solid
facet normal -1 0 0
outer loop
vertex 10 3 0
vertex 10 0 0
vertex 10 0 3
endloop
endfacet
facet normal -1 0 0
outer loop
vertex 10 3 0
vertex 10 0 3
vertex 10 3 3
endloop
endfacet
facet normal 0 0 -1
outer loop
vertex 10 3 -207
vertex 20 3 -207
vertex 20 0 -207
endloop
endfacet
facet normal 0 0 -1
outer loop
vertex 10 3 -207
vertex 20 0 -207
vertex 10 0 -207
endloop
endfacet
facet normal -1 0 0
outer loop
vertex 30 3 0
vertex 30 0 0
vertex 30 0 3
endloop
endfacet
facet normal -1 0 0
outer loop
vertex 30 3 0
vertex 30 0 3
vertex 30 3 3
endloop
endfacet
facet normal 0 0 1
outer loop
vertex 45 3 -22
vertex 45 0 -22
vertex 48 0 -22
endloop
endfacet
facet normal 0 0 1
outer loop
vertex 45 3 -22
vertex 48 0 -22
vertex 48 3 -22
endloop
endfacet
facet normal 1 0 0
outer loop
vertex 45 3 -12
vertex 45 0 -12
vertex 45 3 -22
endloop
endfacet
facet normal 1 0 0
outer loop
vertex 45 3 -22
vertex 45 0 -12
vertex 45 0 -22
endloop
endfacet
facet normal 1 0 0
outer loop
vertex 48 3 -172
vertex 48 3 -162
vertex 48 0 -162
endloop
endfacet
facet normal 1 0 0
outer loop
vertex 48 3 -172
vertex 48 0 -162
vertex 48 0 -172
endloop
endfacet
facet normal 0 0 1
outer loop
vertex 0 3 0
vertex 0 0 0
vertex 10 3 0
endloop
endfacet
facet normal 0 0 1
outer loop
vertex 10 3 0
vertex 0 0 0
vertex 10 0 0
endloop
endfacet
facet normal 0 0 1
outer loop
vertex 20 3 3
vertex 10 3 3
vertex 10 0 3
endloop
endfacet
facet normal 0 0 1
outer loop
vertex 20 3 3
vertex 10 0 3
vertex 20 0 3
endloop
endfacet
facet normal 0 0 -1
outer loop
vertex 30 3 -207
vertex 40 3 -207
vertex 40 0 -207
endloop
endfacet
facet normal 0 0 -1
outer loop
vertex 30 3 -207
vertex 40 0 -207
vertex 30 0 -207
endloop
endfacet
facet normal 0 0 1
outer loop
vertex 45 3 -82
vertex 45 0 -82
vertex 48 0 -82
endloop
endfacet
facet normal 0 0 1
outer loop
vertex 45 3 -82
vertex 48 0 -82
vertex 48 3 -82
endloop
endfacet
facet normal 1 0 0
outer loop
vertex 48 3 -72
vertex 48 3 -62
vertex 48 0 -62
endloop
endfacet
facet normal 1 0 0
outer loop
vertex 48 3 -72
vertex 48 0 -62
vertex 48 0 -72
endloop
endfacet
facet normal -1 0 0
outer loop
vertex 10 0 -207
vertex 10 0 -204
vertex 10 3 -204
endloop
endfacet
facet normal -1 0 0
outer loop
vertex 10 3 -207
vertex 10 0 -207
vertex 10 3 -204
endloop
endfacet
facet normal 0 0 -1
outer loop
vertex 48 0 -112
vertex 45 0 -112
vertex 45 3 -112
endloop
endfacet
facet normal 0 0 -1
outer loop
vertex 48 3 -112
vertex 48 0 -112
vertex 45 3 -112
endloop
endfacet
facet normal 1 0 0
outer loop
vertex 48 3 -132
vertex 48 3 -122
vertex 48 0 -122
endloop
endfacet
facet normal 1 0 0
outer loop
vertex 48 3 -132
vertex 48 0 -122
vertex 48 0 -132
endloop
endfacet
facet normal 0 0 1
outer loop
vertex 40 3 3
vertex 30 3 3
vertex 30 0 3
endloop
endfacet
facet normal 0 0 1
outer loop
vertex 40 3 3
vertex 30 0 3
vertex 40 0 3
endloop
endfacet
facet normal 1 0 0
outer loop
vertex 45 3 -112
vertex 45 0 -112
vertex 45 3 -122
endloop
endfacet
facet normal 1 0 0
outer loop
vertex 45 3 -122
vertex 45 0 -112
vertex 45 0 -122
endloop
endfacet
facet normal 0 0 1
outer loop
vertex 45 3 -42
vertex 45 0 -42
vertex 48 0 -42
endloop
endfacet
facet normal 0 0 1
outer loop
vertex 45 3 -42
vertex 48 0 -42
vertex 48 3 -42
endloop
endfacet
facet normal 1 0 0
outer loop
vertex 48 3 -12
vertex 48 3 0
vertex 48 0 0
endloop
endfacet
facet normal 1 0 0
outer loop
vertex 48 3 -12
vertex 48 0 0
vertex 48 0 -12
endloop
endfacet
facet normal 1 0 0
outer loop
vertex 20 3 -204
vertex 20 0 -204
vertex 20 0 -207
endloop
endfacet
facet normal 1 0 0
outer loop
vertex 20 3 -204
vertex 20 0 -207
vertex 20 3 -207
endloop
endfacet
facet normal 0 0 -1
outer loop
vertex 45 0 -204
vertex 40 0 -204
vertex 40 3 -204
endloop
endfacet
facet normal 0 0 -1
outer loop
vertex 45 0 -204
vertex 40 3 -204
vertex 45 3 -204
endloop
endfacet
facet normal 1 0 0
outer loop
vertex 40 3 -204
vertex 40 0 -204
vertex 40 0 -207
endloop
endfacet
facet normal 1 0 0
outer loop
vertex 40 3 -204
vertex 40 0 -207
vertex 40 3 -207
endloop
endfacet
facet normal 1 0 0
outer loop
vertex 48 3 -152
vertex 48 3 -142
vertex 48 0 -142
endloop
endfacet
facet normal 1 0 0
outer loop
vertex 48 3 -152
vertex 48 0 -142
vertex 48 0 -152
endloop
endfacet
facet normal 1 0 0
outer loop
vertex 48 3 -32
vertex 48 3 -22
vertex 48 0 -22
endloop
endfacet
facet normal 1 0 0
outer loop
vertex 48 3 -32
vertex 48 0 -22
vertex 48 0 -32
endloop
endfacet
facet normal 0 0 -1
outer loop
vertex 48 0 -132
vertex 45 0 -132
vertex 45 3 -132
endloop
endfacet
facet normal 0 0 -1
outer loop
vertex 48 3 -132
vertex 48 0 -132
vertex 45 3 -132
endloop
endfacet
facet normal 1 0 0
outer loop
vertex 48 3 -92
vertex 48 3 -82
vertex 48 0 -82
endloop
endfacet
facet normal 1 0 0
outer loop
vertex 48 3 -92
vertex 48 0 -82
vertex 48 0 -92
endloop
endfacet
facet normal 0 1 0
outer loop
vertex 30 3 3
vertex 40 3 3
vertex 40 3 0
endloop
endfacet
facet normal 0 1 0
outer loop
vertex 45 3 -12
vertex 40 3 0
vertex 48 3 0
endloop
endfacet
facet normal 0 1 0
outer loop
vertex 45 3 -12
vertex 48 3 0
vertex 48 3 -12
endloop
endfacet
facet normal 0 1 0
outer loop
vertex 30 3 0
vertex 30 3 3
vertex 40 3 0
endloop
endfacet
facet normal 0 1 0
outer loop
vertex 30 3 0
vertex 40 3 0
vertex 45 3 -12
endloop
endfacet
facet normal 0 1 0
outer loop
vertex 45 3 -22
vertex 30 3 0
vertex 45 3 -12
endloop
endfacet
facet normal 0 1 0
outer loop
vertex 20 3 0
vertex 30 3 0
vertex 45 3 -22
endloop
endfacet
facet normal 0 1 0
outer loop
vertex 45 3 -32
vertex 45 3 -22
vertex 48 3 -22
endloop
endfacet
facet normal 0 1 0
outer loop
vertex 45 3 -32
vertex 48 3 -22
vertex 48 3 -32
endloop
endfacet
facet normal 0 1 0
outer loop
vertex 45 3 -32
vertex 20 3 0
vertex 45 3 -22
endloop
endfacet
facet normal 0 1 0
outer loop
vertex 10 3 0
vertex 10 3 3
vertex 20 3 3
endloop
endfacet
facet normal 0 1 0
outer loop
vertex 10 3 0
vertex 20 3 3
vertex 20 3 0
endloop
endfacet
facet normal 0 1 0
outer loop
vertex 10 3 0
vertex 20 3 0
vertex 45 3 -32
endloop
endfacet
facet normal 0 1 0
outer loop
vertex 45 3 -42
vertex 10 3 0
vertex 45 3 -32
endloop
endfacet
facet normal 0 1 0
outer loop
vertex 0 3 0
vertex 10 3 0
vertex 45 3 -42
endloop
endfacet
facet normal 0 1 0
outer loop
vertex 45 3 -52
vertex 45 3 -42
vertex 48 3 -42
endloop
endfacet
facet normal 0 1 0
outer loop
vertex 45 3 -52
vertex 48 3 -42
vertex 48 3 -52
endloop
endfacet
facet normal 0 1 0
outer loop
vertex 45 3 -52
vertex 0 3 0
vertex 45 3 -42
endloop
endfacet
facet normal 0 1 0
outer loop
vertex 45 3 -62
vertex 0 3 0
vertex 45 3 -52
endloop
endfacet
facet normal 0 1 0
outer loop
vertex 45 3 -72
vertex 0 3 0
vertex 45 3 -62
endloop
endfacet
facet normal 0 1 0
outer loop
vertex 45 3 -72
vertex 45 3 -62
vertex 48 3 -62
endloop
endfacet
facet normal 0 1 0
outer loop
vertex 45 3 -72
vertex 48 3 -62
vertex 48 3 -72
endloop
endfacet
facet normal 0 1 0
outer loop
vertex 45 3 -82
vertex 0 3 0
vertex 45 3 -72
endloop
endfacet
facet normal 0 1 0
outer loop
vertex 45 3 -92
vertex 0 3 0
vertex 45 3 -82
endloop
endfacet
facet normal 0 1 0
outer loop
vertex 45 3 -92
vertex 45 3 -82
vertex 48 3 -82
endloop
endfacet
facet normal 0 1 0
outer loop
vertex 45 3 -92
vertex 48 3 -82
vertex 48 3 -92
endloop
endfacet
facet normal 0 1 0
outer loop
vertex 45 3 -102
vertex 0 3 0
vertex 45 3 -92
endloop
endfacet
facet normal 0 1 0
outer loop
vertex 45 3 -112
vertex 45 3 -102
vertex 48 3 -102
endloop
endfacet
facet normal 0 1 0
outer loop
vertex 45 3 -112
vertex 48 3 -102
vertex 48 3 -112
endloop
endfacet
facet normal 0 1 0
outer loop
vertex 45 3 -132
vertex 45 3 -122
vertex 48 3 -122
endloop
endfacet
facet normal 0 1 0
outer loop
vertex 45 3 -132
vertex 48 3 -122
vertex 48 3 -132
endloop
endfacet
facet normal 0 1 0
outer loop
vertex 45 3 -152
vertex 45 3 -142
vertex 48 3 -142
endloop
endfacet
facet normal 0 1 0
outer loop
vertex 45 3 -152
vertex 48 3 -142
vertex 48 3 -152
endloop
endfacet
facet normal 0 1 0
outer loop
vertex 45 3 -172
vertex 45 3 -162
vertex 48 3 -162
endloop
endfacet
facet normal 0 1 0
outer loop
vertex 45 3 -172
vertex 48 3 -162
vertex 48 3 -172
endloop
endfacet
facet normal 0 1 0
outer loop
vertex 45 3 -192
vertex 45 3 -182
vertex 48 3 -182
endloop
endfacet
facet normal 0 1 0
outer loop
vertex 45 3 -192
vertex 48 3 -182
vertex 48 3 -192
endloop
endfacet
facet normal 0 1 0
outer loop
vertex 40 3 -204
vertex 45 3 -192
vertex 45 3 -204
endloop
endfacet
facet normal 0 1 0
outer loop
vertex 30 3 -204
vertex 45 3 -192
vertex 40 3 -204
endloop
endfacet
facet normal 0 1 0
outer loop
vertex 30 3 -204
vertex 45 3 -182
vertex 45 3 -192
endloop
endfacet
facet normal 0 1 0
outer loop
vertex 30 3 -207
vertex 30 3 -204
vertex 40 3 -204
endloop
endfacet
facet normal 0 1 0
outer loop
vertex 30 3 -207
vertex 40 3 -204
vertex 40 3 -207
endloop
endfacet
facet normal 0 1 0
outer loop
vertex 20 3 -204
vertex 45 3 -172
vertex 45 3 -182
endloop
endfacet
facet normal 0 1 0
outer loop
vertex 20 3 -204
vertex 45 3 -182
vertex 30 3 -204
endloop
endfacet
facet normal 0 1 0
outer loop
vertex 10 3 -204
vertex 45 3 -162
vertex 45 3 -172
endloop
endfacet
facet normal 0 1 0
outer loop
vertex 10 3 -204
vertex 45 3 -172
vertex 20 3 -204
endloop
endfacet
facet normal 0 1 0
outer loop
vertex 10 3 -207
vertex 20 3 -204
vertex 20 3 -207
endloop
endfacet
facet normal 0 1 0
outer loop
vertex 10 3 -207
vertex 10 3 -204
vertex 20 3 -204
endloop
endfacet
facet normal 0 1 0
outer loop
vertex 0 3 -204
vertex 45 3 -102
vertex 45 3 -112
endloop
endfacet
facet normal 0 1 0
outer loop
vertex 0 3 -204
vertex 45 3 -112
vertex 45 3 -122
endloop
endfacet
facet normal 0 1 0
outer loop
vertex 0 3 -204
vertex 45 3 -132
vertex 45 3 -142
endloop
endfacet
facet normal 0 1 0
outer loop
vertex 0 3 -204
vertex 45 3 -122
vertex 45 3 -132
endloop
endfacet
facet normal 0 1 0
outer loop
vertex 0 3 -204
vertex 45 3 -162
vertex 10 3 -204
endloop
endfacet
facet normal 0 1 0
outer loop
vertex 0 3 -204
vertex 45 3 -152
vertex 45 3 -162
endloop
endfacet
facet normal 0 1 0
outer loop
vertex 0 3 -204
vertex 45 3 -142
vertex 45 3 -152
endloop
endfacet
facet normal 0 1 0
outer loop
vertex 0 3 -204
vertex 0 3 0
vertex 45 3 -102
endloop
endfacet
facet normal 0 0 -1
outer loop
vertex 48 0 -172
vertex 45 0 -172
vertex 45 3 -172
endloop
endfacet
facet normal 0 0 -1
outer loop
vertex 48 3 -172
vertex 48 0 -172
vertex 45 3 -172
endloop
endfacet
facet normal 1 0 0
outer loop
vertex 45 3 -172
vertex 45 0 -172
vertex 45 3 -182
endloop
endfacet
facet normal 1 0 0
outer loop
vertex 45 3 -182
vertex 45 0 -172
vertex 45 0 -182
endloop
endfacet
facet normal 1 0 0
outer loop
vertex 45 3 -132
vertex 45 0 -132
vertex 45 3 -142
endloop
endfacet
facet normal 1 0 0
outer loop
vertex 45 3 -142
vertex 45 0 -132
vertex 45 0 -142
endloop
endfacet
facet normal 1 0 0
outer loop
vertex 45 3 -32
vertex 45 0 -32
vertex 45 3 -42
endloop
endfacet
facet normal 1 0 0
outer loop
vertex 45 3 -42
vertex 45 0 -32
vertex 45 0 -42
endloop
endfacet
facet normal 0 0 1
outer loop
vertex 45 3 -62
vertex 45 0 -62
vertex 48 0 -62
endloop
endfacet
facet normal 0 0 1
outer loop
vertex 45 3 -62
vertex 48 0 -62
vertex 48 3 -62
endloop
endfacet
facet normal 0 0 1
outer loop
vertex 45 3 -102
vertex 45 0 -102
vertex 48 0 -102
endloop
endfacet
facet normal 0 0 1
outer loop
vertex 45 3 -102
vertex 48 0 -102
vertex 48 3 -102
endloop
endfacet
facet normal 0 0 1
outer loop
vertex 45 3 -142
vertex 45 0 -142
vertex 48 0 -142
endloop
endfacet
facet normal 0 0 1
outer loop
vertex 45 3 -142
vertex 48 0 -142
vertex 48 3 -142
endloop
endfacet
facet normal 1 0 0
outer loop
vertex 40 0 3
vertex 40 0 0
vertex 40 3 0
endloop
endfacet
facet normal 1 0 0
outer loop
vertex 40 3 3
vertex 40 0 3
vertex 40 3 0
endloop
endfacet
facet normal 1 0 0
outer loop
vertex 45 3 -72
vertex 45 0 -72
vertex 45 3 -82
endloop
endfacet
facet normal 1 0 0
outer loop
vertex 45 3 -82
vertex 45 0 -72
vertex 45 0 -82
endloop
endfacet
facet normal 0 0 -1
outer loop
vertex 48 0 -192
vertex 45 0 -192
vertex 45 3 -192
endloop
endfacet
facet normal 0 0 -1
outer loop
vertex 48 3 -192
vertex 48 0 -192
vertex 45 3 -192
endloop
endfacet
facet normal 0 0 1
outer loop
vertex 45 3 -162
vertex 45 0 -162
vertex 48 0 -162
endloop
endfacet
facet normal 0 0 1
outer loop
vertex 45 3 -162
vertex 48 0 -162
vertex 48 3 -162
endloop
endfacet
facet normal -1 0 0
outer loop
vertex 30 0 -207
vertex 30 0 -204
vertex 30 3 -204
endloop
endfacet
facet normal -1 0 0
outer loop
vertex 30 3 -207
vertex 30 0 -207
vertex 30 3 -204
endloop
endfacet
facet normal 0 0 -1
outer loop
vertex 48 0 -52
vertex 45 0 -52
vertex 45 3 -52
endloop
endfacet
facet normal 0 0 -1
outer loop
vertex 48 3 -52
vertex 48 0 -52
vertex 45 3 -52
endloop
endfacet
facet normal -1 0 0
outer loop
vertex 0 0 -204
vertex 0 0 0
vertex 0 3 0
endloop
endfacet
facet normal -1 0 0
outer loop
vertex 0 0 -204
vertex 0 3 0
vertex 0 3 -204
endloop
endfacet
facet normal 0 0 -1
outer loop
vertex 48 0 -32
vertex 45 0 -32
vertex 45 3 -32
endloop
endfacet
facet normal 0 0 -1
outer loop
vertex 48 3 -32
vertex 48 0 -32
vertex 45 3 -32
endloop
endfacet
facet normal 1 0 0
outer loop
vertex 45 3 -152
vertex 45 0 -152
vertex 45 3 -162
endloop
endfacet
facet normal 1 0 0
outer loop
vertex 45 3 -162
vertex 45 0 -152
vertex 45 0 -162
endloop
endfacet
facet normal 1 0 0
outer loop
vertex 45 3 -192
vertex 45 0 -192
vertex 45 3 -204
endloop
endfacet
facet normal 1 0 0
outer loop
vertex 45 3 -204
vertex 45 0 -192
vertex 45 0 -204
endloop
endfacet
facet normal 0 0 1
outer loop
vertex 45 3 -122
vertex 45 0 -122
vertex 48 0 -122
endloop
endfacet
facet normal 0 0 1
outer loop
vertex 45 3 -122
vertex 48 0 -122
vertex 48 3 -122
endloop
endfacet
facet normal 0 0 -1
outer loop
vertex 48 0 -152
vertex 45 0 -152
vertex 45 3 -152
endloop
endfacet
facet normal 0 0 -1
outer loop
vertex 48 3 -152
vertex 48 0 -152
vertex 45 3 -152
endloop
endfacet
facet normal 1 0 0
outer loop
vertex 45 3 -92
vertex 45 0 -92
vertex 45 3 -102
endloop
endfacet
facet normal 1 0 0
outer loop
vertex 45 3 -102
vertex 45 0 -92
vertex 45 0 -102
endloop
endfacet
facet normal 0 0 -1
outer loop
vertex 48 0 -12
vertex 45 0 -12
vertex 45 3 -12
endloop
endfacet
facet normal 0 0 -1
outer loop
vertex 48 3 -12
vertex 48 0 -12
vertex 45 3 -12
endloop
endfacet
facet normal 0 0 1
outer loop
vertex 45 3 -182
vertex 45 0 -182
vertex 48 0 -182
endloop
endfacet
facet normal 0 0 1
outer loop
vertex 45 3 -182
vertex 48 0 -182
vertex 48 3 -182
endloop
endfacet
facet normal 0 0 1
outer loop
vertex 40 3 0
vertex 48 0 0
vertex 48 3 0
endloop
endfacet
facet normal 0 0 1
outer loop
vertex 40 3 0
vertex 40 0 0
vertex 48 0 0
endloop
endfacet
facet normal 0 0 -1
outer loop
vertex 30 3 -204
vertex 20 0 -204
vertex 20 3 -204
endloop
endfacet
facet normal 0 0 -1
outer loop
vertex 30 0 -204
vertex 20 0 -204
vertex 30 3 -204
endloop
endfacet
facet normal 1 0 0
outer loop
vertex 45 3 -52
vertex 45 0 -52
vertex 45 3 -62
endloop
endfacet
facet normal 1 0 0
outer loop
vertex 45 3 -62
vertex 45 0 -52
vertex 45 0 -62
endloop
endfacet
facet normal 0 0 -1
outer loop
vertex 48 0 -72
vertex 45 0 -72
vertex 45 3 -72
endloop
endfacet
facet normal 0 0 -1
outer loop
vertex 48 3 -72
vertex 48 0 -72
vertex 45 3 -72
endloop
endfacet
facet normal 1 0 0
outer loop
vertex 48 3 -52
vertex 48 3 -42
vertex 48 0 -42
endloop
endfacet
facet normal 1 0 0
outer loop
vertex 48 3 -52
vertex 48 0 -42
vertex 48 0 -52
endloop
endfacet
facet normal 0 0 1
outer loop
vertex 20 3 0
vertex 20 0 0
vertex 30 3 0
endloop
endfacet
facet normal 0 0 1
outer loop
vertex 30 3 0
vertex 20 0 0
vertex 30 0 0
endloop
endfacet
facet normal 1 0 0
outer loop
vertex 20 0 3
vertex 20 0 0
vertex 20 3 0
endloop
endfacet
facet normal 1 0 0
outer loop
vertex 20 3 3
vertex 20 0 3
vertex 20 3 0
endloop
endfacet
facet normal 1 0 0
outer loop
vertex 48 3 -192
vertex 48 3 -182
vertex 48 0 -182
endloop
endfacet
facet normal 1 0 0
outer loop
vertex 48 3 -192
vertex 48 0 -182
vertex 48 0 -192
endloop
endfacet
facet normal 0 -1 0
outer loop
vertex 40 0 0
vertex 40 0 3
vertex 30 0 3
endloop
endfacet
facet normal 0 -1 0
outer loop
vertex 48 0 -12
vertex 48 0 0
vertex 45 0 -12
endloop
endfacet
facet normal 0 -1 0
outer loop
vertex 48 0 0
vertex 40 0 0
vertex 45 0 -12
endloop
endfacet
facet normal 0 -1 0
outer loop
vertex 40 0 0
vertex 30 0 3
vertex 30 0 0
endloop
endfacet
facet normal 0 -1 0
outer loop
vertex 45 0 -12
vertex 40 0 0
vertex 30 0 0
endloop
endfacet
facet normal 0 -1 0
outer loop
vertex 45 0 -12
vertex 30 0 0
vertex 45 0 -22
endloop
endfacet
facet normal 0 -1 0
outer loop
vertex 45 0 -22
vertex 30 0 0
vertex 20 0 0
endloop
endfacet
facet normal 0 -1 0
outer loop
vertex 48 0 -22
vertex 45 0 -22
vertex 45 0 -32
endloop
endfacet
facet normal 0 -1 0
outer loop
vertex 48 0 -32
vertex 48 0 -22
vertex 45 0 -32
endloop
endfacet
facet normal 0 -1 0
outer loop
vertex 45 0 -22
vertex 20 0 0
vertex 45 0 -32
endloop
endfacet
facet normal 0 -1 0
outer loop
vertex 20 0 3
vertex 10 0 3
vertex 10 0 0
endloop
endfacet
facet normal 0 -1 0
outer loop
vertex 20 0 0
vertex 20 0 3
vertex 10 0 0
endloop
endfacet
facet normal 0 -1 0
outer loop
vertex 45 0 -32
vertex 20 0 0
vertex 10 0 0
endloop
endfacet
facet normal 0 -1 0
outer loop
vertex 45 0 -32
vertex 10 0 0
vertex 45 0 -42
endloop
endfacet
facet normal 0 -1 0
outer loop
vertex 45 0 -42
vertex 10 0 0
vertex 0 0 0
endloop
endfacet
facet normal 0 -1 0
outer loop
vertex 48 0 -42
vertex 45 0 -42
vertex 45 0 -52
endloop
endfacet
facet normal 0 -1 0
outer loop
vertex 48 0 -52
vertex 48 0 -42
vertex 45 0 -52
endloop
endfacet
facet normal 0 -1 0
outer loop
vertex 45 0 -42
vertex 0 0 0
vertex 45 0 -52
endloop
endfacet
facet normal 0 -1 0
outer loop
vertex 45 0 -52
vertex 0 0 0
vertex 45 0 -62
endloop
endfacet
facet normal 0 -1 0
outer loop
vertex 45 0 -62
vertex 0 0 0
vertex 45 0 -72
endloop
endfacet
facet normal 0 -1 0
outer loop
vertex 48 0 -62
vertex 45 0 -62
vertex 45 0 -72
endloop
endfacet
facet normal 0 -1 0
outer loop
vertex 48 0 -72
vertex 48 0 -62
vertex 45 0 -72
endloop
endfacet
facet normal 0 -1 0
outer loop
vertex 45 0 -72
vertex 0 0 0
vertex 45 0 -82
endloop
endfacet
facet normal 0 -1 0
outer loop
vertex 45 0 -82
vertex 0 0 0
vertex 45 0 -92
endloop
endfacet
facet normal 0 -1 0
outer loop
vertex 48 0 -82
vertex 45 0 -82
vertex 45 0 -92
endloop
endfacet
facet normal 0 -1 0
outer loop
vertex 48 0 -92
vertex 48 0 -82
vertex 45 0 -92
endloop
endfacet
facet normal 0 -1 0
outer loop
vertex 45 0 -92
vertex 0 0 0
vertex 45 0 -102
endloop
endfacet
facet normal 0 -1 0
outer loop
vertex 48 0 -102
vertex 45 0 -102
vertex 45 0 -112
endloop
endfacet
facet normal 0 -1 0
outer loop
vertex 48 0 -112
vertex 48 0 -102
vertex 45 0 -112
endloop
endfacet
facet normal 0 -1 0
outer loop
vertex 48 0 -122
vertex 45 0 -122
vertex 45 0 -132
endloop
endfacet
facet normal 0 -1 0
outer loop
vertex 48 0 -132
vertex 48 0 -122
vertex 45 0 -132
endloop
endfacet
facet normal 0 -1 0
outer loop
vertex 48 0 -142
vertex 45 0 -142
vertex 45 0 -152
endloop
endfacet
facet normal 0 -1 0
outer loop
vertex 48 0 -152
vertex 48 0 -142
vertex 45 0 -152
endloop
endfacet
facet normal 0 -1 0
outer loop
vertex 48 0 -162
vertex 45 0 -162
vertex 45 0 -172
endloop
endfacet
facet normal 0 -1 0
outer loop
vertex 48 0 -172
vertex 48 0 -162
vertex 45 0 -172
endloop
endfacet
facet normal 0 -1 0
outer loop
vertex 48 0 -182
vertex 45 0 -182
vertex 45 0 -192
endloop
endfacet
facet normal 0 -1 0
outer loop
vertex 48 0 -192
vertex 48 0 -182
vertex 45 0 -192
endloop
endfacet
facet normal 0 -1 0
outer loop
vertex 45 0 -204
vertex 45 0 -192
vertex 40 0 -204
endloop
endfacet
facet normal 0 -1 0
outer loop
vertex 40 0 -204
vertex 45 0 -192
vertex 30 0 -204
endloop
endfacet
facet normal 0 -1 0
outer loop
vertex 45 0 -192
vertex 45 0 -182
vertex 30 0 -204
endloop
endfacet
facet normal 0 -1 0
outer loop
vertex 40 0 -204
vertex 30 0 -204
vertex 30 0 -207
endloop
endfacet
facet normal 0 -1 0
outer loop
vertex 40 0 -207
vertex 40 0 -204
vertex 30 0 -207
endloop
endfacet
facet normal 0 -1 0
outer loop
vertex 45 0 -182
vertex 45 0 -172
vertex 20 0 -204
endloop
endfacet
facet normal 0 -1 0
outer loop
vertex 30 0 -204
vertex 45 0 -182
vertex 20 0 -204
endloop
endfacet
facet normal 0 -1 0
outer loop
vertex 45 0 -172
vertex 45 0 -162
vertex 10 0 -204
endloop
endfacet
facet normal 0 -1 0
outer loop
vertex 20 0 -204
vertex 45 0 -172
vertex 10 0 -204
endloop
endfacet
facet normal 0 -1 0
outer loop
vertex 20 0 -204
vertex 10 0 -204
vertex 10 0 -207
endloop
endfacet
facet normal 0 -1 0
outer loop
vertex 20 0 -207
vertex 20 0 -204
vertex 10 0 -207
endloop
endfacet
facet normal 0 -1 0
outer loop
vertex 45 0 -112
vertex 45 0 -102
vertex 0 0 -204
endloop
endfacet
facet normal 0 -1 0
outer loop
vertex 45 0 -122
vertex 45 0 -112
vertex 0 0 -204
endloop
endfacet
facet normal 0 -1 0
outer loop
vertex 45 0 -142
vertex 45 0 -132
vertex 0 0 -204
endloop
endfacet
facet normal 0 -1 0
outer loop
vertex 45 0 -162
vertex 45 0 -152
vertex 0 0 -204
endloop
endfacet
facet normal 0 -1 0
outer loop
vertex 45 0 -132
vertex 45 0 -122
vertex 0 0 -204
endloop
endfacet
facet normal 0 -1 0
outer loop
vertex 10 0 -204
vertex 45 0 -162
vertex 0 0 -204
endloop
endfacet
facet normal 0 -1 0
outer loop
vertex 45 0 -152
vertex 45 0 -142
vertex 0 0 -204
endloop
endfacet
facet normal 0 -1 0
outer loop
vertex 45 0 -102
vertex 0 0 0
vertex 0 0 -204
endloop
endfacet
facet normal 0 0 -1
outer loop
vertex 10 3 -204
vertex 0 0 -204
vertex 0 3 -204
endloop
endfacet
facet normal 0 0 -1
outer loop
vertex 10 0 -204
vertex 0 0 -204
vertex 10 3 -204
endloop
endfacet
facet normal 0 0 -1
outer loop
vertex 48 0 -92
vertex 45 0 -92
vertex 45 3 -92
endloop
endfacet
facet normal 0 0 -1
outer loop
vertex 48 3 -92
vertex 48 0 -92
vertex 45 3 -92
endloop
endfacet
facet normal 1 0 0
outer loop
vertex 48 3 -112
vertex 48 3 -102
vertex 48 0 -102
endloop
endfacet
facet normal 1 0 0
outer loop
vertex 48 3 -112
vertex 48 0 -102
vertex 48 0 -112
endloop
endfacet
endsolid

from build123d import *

# Parameters (mm, degrees)
SKETCH1_W           = 45
SKETCH1_H           = 204
BOSS_EXTRUDE1_DEPTH = 3
SKETCH2_W           = 10
SKETCH2_H           = 3
BOSS_EXTRUDE2_DEPTH = 3
LPATTERN1_COUNT     = 2
LPATTERN1_PITCH     = 20
SKETCH3_W           = 10
SKETCH3_H           = 3
BOSS_EXTRUDE3_DEPTH = 3
LPATTERN2_COUNT     = 2
LPATTERN2_PITCH     = 20
SKETCH4_W           = 12
SKETCH4_H           = 3
SKETCH4_W_2         = 10
BOSS_EXTRUDE4_DEPTH = 3


with BuildPart() as part:
    # Sketch1 → Boss-Extrude1 (new body)
    with BuildSketch(Plane(origin=(0, 0, 0), x_dir=(1, 0, 0), z_dir=(0, 1, 0))):
        with Locations((22.5, 102)):
            Rectangle(SKETCH1_W, SKETCH1_H)
    extrude(amount=BOSS_EXTRUDE1_DEPTH)

    # Sketch2 → Boss-Extrude2 (add)
    with BuildSketch(Plane.XY):
        with Locations((35, 1.5)):
            Rectangle(SKETCH2_W, SKETCH2_H)
    boss_extrude2 = extrude(amount=BOSS_EXTRUDE2_DEPTH)

    # LPattern1: Boss-Extrude2 ×2
    with Locations(*[(-i * LPATTERN1_PITCH, 0, 0) for i in range(1, LPATTERN1_COUNT)]):
        add(boss_extrude2)

    # Sketch3 → Boss-Extrude3 (add)
    with BuildSketch(Plane(origin=(0, 0, -204), x_dir=(-1, 0, 0), z_dir=(0, 0, -1))):
        with Locations((-35, 1.5)):
            Rectangle(SKETCH3_W, SKETCH3_H)
    boss_extrude3 = extrude(amount=BOSS_EXTRUDE3_DEPTH)

    # LPattern2: Boss-Extrude3 ×2
    with Locations(*[(-i * LPATTERN2_PITCH, 0, 0) for i in range(1, LPATTERN2_COUNT)]):
        add(boss_extrude3)

    # Sketch4 → Boss-Extrude4 (add)
    with BuildSketch(Plane(origin=(45, 0, 0), x_dir=(0, 0, -1), z_dir=(1, 0, 0))):
        with Locations((6, 1.5)):
            Rectangle(SKETCH4_W, SKETCH4_H)
        with Locations((27, 1.5)):
            Rectangle(SKETCH4_W_2, SKETCH4_H)
        with Locations((47, 1.5)):
            Rectangle(SKETCH4_W_2, SKETCH4_H)
        with Locations((67, 1.5)):
            Rectangle(SKETCH4_W_2, SKETCH4_H)
        with Locations((87, 1.5)):
            Rectangle(SKETCH4_W_2, SKETCH4_H)
        with Locations((107, 1.5)):
            Rectangle(SKETCH4_W_2, SKETCH4_H)
        with Locations((127, 1.5)):
            Rectangle(SKETCH4_W_2, SKETCH4_H)
        with Locations((147, 1.5)):
            Rectangle(SKETCH4_W_2, SKETCH4_H)
        with Locations((167, 1.5)):
            Rectangle(SKETCH4_W_2, SKETCH4_H)
        with Locations((187, 1.5)):
            Rectangle(SKETCH4_W_2, SKETCH4_H)
    extrude(amount=BOSS_EXTRUDE4_DEPTH)


solid = part.part
